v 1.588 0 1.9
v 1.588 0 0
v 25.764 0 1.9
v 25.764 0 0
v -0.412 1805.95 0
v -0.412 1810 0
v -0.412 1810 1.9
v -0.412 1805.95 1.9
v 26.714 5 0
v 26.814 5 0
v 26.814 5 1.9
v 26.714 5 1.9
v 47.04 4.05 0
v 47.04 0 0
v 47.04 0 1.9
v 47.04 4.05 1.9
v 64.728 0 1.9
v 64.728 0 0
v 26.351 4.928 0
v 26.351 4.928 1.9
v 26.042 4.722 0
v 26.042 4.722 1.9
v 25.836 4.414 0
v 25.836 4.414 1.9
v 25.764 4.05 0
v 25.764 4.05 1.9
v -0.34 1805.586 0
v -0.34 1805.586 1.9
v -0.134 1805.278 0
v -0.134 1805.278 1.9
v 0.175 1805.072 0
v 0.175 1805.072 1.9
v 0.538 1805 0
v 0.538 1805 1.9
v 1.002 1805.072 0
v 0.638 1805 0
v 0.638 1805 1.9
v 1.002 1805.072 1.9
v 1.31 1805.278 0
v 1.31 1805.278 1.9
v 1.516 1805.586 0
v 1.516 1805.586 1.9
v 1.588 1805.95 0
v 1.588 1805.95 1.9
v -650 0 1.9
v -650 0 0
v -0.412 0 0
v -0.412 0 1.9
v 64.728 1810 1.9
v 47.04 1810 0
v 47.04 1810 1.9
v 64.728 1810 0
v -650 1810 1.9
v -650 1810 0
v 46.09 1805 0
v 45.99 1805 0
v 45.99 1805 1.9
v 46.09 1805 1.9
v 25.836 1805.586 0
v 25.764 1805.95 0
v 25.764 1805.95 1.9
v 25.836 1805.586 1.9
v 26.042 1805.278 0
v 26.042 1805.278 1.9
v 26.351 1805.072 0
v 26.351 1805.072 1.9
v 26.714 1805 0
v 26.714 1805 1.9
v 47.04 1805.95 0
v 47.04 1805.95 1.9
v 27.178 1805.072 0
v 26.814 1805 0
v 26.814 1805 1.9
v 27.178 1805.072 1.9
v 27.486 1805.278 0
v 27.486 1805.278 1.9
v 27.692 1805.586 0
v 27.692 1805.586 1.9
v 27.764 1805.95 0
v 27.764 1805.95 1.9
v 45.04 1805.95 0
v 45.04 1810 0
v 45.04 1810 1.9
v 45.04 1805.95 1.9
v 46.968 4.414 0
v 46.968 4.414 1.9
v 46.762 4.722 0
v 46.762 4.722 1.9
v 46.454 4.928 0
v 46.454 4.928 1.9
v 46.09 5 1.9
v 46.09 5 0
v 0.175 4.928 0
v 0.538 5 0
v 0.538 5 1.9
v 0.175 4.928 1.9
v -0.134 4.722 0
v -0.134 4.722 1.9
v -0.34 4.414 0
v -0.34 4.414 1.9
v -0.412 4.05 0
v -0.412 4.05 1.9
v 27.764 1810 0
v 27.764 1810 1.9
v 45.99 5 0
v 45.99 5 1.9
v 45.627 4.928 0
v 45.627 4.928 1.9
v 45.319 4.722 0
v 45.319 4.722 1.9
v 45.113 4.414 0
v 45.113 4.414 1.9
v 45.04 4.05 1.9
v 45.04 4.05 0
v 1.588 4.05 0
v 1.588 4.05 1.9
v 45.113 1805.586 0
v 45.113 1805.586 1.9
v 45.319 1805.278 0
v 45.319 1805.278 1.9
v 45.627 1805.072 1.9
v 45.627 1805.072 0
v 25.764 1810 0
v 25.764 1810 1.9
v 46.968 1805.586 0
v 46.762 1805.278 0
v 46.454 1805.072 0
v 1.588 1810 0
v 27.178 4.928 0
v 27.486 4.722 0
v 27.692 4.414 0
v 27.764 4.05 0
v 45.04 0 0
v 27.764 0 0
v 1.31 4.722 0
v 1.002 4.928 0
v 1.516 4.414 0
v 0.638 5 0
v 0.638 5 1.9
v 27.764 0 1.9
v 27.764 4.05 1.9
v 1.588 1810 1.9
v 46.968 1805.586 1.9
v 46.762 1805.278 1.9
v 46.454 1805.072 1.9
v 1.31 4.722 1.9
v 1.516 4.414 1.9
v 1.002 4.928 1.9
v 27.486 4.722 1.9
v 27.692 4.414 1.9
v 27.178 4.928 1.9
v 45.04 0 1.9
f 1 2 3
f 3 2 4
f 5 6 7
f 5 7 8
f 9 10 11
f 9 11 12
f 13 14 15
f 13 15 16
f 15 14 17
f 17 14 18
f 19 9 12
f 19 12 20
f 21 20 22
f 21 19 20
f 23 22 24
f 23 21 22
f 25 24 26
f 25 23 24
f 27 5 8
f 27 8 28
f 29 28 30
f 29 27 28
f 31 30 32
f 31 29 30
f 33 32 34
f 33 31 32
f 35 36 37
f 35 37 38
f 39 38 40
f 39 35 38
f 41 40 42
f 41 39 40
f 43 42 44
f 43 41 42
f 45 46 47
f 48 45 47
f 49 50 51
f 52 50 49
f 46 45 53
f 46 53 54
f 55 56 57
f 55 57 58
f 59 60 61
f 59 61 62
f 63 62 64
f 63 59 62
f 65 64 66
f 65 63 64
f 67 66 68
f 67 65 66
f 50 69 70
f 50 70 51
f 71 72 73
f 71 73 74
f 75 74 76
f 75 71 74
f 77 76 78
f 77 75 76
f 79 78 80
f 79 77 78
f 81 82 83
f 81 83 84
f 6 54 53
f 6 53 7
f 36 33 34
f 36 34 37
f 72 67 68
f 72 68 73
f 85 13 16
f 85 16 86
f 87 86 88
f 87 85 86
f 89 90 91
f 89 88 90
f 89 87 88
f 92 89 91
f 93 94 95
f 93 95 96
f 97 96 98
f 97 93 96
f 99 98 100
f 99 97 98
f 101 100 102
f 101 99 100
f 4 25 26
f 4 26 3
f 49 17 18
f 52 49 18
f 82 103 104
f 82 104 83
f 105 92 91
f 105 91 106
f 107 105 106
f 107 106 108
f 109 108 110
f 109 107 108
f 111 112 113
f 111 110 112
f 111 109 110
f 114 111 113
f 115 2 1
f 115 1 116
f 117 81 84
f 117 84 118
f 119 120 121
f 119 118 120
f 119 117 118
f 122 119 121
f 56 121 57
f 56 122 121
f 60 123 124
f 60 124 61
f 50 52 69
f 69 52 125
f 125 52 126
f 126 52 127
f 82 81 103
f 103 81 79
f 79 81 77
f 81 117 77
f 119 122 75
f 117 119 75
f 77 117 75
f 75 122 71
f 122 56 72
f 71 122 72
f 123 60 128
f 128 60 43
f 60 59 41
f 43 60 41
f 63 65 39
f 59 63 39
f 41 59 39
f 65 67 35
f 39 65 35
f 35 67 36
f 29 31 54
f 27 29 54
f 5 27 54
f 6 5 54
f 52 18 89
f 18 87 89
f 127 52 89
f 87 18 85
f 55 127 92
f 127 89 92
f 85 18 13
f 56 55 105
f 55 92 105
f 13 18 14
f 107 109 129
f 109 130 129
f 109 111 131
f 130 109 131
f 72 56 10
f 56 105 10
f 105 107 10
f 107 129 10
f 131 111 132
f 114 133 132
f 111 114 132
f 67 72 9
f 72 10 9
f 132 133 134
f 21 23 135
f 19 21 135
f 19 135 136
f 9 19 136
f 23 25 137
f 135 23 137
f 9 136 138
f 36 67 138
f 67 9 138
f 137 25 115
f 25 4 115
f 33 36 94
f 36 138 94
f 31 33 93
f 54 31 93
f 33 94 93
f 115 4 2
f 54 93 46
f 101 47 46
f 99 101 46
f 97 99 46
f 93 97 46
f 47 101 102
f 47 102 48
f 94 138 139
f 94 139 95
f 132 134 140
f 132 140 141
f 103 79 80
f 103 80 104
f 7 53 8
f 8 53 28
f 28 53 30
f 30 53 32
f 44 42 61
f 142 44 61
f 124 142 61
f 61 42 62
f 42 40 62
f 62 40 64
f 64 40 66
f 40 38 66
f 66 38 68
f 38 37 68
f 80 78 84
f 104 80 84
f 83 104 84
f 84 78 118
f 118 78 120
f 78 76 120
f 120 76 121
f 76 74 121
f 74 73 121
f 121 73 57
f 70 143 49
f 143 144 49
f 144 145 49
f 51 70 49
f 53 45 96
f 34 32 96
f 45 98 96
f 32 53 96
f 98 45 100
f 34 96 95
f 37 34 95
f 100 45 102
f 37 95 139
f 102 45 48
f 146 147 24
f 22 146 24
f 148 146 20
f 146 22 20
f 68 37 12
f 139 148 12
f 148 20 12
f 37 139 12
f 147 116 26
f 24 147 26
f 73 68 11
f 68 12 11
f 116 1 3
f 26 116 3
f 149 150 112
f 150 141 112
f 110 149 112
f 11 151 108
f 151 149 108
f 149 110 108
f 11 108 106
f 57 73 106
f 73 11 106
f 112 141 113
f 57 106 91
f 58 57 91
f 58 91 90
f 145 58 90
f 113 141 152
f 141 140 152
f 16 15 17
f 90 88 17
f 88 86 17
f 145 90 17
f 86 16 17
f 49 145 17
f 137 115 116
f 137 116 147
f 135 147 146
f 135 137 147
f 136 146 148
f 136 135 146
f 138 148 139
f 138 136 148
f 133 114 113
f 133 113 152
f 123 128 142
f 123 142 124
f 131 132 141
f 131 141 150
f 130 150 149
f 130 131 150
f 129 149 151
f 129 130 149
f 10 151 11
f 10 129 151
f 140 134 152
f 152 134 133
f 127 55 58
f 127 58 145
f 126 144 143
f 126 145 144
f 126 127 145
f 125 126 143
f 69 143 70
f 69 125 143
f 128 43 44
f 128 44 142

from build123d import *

# Parameters (mm, degrees)
BRIDA_BASE2_DEPTH          = 1810
DESDOBLAR1_DEPTH           = 1810
DESDOBLAR1_2_DEPTH         = 1810
CORTAR_EXTRUIR2_DEPTH      = 1924.175397617
CORTAR_EXTRUIR2_DEPTH_BACK = 1924.175397617


# Read off the part's stored shape, not the designer's step: Desdoblar1
# Sheet-metal steps are written as plain solids
with BuildPart() as part:
    # Croquis4 → Brida base2 (new body)
    with BuildSketch(Plane(origin=(0, 0, 0), x_dir=(1, 0, 0), z_dir=(0, 1, 0))):
        with BuildLine():
            Line((-650, 0), (-0.7366, 0))
            ThreePointArc((-0.7366, 0), (-0.215745145, 0.215745145), (0, 0.7366))
            Line((0, 0.7366), (0, 24.2634))
            ThreePointArc((0, 24.2634), (-0.215745145, 24.784254855), (-0.7366, 25))
            Line((-0.7366, 25), (-17.3634, 25))
            ThreePointArc((-17.3634, 25), (-19.227757739, 25.772242261), (-20, 27.6366))
            Line((-20, 27.6366), (-20, 45))
            Line((-20, 45), (-18.1, 45))
            Line((-18.1, 45), (-18.1, 27.6366))
            ThreePointArc((-18.1, 27.6366), (-17.884254855, 27.115745145), (-17.3634, 26.9))
            Line((-17.3634, 26.9), (-0.7366, 26.9))
            ThreePointArc((-0.7366, 26.9), (1.127757739, 26.127757739), (1.9, 24.2634))
            Line((1.9, 24.2634), (1.9, 0.7366))
            ThreePointArc((1.9, 0.7366), (1.127757739, -1.127757739), (-0.7366, -1.9))
            Line((-0.7366, -1.9), (-650, -1.9))
            Line((-650, -1.9), (-650, 0))
        make_face()
    extrude(amount=BRIDA_BASE2_DEPTH)

    # Desdoblar1 outline → Desdoblar1 (cut)
    with BuildSketch(Plane(origin=(0, 0, 0), x_dir=(1, 0, 0), z_dir=(0, 1, 0))):
        with BuildLine():
            Line((-0.7366, 0), (1.795016084, 0))
            ThreePointArc((1.795016084, 0), (1.873622072, 0.364578098), (1.9, 0.7366))
            Line((1.9, 0.7366), (1.9, 24.2634))
            ThreePointArc((1.9, 24.2634), (1.127757739, 26.127757739), (-0.7366, 26.9))
            Line((-0.7366, 26.9), (-17.3634, 26.9))
            ThreePointArc((-17.3634, 26.9), (-17.884254855, 27.115745145), (-18.1, 27.6366))
            Line((-18.1, 27.6366), (-18.1, 45))
            Line((-18.1, 45), (-20, 45))
            Line((-20, 45), (-20, 27.6366))
            ThreePointArc((-20, 27.6366), (-19.227757739, 25.772242261), (-17.3634, 25))
            Line((-17.3634, 25), (-0.7366, 25))
            ThreePointArc((-0.7366, 25), (-0.215745145, 24.784254855), (0, 24.2634))
            Line((0, 24.2634), (0, 0.7366))
            ThreePointArc((0, 0.7366), (-0.215745145, 0.215745145), (-0.7366, 0))
        make_face()
    extrude(amount=DESDOBLAR1_DEPTH, mode=Mode.SUBTRACT)

    # Desdoblar1 2 outline → Desdoblar1 2 (add)
    with BuildSketch(Plane(origin=(0, 0, 0), x_dir=(1, 0, 0), z_dir=(0, 1, 0))):
        with BuildLine():
            Line((64.728315254, 0), (1.795016084, 0))
            ThreePointArc((1.795016084, 0), (0.846046517, -1.372164937), (-0.7366, -1.9))
            Line((-0.7366, -1.9), (64.728315254, -1.9))
            Line((64.728315254, -1.9), (64.728315254, 0))
        make_face()
    extrude(amount=DESDOBLAR1_2_DEPTH)

    # Croquis15 → Cortar-Extruir2 (cut, two sides: drawn at the far end of the back side and taken through both)
    with BuildSketch(Plane.XY.offset(1.9).offset(-CORTAR_EXTRUIR2_DEPTH_BACK)):
        with BuildLine():
            Line((-0.411947458, 0), (1.588052542, 0))
            Line((1.588052542, 0), (1.588052542, 4.05))
            ThreePointArc((1.588052542, 4.05), (1.309803985, 4.721751442), (0.638052542, 5))
            Line((0.638052542, 5), (0.538052542, 5))
            ThreePointArc((0.538052542, 5), (-0.1336989, 4.721751442), (-0.411947458, 4.05))
            Line((-0.411947458, 4.05), (-0.411947458, 0))
        make_face()
        with BuildLine():
            Line((45.040262712, 0), (47.040262712, 0))
            Line((47.040262712, 0), (47.040262712, 4.05))
            ThreePointArc((47.040262712, 4.05), (46.762014154, 4.721751442), (46.090262712, 5))
            Line((46.090262712, 5), (45.990262712, 5))
            ThreePointArc((45.990262712, 5), (45.31851127, 4.721751442), (45.040262712, 4.05))
            Line((45.040262712, 4.05), (45.040262712, 0))
        make_face()
        with BuildLine():
            Line((45.040262712, 1810), (45.040262712, 1805.95))
            ThreePointArc((45.040262712, 1805.95), (45.31851127, 1805.278248558), (45.990262712, 1805))
            Line((45.990262712, 1805), (46.090262712, 1805))
            ThreePointArc((46.090262712, 1805), (46.762014154, 1805.278248558), (47.040262712, 1805.95))
            Line((47.040262712, 1805.95), (47.040262712, 1810))
            Line((47.040262712, 1810), (45.040262712, 1810))
        make_face()
        with BuildLine():
            Line((25.764157627, 1810), (25.764157627, 1805.95))
            ThreePointArc((25.764157627, 1805.95), (26.042406185, 1805.278248558), (26.714157627, 1805))
            Line((26.714157627, 1805), (26.814157627, 1805))
            ThreePointArc((26.814157627, 1805), (27.485909069, 1805.278248558), (27.764157627, 1805.95))
            Line((27.764157627, 1805.95), (27.764157627, 1810))
            Line((27.764157627, 1810), (25.764157627, 1810))
        make_face()
        with BuildLine():
            Line((1.588052542, 1805.95), (1.588052542, 1810))
            Line((1.588052542, 1810), (-0.411947458, 1810))
            Line((-0.411947458, 1810), (-0.411947458, 1805.95))
            ThreePointArc((-0.411947458, 1805.95), (-0.1336989, 1805.278248558), (0.538052542, 1805))
            Line((0.538052542, 1805), (0.638052542, 1805))
            ThreePointArc((0.638052542, 1805), (1.309803985, 1805.278248558), (1.588052542, 1805.95))
        make_face()
        with BuildLine():
            Line((27.764157627, 0), (27.764157627, 4.05))
            ThreePointArc((27.764157627, 4.05), (27.485909069, 4.721751442), (26.814157627, 5))
            Line((26.814157627, 5), (26.714157627, 5))
            ThreePointArc((26.714157627, 5), (26.042406185, 4.721751442), (25.764157627, 4.05))
            Line((25.764157627, 4.05), (25.764157627, 0))
            Line((25.764157627, 0), (27.764157627, 0))
        make_face()
    extrude(amount=CORTAR_EXTRUIR2_DEPTH + CORTAR_EXTRUIR2_DEPTH_BACK, mode=Mode.SUBTRACT)


solid = part.part
